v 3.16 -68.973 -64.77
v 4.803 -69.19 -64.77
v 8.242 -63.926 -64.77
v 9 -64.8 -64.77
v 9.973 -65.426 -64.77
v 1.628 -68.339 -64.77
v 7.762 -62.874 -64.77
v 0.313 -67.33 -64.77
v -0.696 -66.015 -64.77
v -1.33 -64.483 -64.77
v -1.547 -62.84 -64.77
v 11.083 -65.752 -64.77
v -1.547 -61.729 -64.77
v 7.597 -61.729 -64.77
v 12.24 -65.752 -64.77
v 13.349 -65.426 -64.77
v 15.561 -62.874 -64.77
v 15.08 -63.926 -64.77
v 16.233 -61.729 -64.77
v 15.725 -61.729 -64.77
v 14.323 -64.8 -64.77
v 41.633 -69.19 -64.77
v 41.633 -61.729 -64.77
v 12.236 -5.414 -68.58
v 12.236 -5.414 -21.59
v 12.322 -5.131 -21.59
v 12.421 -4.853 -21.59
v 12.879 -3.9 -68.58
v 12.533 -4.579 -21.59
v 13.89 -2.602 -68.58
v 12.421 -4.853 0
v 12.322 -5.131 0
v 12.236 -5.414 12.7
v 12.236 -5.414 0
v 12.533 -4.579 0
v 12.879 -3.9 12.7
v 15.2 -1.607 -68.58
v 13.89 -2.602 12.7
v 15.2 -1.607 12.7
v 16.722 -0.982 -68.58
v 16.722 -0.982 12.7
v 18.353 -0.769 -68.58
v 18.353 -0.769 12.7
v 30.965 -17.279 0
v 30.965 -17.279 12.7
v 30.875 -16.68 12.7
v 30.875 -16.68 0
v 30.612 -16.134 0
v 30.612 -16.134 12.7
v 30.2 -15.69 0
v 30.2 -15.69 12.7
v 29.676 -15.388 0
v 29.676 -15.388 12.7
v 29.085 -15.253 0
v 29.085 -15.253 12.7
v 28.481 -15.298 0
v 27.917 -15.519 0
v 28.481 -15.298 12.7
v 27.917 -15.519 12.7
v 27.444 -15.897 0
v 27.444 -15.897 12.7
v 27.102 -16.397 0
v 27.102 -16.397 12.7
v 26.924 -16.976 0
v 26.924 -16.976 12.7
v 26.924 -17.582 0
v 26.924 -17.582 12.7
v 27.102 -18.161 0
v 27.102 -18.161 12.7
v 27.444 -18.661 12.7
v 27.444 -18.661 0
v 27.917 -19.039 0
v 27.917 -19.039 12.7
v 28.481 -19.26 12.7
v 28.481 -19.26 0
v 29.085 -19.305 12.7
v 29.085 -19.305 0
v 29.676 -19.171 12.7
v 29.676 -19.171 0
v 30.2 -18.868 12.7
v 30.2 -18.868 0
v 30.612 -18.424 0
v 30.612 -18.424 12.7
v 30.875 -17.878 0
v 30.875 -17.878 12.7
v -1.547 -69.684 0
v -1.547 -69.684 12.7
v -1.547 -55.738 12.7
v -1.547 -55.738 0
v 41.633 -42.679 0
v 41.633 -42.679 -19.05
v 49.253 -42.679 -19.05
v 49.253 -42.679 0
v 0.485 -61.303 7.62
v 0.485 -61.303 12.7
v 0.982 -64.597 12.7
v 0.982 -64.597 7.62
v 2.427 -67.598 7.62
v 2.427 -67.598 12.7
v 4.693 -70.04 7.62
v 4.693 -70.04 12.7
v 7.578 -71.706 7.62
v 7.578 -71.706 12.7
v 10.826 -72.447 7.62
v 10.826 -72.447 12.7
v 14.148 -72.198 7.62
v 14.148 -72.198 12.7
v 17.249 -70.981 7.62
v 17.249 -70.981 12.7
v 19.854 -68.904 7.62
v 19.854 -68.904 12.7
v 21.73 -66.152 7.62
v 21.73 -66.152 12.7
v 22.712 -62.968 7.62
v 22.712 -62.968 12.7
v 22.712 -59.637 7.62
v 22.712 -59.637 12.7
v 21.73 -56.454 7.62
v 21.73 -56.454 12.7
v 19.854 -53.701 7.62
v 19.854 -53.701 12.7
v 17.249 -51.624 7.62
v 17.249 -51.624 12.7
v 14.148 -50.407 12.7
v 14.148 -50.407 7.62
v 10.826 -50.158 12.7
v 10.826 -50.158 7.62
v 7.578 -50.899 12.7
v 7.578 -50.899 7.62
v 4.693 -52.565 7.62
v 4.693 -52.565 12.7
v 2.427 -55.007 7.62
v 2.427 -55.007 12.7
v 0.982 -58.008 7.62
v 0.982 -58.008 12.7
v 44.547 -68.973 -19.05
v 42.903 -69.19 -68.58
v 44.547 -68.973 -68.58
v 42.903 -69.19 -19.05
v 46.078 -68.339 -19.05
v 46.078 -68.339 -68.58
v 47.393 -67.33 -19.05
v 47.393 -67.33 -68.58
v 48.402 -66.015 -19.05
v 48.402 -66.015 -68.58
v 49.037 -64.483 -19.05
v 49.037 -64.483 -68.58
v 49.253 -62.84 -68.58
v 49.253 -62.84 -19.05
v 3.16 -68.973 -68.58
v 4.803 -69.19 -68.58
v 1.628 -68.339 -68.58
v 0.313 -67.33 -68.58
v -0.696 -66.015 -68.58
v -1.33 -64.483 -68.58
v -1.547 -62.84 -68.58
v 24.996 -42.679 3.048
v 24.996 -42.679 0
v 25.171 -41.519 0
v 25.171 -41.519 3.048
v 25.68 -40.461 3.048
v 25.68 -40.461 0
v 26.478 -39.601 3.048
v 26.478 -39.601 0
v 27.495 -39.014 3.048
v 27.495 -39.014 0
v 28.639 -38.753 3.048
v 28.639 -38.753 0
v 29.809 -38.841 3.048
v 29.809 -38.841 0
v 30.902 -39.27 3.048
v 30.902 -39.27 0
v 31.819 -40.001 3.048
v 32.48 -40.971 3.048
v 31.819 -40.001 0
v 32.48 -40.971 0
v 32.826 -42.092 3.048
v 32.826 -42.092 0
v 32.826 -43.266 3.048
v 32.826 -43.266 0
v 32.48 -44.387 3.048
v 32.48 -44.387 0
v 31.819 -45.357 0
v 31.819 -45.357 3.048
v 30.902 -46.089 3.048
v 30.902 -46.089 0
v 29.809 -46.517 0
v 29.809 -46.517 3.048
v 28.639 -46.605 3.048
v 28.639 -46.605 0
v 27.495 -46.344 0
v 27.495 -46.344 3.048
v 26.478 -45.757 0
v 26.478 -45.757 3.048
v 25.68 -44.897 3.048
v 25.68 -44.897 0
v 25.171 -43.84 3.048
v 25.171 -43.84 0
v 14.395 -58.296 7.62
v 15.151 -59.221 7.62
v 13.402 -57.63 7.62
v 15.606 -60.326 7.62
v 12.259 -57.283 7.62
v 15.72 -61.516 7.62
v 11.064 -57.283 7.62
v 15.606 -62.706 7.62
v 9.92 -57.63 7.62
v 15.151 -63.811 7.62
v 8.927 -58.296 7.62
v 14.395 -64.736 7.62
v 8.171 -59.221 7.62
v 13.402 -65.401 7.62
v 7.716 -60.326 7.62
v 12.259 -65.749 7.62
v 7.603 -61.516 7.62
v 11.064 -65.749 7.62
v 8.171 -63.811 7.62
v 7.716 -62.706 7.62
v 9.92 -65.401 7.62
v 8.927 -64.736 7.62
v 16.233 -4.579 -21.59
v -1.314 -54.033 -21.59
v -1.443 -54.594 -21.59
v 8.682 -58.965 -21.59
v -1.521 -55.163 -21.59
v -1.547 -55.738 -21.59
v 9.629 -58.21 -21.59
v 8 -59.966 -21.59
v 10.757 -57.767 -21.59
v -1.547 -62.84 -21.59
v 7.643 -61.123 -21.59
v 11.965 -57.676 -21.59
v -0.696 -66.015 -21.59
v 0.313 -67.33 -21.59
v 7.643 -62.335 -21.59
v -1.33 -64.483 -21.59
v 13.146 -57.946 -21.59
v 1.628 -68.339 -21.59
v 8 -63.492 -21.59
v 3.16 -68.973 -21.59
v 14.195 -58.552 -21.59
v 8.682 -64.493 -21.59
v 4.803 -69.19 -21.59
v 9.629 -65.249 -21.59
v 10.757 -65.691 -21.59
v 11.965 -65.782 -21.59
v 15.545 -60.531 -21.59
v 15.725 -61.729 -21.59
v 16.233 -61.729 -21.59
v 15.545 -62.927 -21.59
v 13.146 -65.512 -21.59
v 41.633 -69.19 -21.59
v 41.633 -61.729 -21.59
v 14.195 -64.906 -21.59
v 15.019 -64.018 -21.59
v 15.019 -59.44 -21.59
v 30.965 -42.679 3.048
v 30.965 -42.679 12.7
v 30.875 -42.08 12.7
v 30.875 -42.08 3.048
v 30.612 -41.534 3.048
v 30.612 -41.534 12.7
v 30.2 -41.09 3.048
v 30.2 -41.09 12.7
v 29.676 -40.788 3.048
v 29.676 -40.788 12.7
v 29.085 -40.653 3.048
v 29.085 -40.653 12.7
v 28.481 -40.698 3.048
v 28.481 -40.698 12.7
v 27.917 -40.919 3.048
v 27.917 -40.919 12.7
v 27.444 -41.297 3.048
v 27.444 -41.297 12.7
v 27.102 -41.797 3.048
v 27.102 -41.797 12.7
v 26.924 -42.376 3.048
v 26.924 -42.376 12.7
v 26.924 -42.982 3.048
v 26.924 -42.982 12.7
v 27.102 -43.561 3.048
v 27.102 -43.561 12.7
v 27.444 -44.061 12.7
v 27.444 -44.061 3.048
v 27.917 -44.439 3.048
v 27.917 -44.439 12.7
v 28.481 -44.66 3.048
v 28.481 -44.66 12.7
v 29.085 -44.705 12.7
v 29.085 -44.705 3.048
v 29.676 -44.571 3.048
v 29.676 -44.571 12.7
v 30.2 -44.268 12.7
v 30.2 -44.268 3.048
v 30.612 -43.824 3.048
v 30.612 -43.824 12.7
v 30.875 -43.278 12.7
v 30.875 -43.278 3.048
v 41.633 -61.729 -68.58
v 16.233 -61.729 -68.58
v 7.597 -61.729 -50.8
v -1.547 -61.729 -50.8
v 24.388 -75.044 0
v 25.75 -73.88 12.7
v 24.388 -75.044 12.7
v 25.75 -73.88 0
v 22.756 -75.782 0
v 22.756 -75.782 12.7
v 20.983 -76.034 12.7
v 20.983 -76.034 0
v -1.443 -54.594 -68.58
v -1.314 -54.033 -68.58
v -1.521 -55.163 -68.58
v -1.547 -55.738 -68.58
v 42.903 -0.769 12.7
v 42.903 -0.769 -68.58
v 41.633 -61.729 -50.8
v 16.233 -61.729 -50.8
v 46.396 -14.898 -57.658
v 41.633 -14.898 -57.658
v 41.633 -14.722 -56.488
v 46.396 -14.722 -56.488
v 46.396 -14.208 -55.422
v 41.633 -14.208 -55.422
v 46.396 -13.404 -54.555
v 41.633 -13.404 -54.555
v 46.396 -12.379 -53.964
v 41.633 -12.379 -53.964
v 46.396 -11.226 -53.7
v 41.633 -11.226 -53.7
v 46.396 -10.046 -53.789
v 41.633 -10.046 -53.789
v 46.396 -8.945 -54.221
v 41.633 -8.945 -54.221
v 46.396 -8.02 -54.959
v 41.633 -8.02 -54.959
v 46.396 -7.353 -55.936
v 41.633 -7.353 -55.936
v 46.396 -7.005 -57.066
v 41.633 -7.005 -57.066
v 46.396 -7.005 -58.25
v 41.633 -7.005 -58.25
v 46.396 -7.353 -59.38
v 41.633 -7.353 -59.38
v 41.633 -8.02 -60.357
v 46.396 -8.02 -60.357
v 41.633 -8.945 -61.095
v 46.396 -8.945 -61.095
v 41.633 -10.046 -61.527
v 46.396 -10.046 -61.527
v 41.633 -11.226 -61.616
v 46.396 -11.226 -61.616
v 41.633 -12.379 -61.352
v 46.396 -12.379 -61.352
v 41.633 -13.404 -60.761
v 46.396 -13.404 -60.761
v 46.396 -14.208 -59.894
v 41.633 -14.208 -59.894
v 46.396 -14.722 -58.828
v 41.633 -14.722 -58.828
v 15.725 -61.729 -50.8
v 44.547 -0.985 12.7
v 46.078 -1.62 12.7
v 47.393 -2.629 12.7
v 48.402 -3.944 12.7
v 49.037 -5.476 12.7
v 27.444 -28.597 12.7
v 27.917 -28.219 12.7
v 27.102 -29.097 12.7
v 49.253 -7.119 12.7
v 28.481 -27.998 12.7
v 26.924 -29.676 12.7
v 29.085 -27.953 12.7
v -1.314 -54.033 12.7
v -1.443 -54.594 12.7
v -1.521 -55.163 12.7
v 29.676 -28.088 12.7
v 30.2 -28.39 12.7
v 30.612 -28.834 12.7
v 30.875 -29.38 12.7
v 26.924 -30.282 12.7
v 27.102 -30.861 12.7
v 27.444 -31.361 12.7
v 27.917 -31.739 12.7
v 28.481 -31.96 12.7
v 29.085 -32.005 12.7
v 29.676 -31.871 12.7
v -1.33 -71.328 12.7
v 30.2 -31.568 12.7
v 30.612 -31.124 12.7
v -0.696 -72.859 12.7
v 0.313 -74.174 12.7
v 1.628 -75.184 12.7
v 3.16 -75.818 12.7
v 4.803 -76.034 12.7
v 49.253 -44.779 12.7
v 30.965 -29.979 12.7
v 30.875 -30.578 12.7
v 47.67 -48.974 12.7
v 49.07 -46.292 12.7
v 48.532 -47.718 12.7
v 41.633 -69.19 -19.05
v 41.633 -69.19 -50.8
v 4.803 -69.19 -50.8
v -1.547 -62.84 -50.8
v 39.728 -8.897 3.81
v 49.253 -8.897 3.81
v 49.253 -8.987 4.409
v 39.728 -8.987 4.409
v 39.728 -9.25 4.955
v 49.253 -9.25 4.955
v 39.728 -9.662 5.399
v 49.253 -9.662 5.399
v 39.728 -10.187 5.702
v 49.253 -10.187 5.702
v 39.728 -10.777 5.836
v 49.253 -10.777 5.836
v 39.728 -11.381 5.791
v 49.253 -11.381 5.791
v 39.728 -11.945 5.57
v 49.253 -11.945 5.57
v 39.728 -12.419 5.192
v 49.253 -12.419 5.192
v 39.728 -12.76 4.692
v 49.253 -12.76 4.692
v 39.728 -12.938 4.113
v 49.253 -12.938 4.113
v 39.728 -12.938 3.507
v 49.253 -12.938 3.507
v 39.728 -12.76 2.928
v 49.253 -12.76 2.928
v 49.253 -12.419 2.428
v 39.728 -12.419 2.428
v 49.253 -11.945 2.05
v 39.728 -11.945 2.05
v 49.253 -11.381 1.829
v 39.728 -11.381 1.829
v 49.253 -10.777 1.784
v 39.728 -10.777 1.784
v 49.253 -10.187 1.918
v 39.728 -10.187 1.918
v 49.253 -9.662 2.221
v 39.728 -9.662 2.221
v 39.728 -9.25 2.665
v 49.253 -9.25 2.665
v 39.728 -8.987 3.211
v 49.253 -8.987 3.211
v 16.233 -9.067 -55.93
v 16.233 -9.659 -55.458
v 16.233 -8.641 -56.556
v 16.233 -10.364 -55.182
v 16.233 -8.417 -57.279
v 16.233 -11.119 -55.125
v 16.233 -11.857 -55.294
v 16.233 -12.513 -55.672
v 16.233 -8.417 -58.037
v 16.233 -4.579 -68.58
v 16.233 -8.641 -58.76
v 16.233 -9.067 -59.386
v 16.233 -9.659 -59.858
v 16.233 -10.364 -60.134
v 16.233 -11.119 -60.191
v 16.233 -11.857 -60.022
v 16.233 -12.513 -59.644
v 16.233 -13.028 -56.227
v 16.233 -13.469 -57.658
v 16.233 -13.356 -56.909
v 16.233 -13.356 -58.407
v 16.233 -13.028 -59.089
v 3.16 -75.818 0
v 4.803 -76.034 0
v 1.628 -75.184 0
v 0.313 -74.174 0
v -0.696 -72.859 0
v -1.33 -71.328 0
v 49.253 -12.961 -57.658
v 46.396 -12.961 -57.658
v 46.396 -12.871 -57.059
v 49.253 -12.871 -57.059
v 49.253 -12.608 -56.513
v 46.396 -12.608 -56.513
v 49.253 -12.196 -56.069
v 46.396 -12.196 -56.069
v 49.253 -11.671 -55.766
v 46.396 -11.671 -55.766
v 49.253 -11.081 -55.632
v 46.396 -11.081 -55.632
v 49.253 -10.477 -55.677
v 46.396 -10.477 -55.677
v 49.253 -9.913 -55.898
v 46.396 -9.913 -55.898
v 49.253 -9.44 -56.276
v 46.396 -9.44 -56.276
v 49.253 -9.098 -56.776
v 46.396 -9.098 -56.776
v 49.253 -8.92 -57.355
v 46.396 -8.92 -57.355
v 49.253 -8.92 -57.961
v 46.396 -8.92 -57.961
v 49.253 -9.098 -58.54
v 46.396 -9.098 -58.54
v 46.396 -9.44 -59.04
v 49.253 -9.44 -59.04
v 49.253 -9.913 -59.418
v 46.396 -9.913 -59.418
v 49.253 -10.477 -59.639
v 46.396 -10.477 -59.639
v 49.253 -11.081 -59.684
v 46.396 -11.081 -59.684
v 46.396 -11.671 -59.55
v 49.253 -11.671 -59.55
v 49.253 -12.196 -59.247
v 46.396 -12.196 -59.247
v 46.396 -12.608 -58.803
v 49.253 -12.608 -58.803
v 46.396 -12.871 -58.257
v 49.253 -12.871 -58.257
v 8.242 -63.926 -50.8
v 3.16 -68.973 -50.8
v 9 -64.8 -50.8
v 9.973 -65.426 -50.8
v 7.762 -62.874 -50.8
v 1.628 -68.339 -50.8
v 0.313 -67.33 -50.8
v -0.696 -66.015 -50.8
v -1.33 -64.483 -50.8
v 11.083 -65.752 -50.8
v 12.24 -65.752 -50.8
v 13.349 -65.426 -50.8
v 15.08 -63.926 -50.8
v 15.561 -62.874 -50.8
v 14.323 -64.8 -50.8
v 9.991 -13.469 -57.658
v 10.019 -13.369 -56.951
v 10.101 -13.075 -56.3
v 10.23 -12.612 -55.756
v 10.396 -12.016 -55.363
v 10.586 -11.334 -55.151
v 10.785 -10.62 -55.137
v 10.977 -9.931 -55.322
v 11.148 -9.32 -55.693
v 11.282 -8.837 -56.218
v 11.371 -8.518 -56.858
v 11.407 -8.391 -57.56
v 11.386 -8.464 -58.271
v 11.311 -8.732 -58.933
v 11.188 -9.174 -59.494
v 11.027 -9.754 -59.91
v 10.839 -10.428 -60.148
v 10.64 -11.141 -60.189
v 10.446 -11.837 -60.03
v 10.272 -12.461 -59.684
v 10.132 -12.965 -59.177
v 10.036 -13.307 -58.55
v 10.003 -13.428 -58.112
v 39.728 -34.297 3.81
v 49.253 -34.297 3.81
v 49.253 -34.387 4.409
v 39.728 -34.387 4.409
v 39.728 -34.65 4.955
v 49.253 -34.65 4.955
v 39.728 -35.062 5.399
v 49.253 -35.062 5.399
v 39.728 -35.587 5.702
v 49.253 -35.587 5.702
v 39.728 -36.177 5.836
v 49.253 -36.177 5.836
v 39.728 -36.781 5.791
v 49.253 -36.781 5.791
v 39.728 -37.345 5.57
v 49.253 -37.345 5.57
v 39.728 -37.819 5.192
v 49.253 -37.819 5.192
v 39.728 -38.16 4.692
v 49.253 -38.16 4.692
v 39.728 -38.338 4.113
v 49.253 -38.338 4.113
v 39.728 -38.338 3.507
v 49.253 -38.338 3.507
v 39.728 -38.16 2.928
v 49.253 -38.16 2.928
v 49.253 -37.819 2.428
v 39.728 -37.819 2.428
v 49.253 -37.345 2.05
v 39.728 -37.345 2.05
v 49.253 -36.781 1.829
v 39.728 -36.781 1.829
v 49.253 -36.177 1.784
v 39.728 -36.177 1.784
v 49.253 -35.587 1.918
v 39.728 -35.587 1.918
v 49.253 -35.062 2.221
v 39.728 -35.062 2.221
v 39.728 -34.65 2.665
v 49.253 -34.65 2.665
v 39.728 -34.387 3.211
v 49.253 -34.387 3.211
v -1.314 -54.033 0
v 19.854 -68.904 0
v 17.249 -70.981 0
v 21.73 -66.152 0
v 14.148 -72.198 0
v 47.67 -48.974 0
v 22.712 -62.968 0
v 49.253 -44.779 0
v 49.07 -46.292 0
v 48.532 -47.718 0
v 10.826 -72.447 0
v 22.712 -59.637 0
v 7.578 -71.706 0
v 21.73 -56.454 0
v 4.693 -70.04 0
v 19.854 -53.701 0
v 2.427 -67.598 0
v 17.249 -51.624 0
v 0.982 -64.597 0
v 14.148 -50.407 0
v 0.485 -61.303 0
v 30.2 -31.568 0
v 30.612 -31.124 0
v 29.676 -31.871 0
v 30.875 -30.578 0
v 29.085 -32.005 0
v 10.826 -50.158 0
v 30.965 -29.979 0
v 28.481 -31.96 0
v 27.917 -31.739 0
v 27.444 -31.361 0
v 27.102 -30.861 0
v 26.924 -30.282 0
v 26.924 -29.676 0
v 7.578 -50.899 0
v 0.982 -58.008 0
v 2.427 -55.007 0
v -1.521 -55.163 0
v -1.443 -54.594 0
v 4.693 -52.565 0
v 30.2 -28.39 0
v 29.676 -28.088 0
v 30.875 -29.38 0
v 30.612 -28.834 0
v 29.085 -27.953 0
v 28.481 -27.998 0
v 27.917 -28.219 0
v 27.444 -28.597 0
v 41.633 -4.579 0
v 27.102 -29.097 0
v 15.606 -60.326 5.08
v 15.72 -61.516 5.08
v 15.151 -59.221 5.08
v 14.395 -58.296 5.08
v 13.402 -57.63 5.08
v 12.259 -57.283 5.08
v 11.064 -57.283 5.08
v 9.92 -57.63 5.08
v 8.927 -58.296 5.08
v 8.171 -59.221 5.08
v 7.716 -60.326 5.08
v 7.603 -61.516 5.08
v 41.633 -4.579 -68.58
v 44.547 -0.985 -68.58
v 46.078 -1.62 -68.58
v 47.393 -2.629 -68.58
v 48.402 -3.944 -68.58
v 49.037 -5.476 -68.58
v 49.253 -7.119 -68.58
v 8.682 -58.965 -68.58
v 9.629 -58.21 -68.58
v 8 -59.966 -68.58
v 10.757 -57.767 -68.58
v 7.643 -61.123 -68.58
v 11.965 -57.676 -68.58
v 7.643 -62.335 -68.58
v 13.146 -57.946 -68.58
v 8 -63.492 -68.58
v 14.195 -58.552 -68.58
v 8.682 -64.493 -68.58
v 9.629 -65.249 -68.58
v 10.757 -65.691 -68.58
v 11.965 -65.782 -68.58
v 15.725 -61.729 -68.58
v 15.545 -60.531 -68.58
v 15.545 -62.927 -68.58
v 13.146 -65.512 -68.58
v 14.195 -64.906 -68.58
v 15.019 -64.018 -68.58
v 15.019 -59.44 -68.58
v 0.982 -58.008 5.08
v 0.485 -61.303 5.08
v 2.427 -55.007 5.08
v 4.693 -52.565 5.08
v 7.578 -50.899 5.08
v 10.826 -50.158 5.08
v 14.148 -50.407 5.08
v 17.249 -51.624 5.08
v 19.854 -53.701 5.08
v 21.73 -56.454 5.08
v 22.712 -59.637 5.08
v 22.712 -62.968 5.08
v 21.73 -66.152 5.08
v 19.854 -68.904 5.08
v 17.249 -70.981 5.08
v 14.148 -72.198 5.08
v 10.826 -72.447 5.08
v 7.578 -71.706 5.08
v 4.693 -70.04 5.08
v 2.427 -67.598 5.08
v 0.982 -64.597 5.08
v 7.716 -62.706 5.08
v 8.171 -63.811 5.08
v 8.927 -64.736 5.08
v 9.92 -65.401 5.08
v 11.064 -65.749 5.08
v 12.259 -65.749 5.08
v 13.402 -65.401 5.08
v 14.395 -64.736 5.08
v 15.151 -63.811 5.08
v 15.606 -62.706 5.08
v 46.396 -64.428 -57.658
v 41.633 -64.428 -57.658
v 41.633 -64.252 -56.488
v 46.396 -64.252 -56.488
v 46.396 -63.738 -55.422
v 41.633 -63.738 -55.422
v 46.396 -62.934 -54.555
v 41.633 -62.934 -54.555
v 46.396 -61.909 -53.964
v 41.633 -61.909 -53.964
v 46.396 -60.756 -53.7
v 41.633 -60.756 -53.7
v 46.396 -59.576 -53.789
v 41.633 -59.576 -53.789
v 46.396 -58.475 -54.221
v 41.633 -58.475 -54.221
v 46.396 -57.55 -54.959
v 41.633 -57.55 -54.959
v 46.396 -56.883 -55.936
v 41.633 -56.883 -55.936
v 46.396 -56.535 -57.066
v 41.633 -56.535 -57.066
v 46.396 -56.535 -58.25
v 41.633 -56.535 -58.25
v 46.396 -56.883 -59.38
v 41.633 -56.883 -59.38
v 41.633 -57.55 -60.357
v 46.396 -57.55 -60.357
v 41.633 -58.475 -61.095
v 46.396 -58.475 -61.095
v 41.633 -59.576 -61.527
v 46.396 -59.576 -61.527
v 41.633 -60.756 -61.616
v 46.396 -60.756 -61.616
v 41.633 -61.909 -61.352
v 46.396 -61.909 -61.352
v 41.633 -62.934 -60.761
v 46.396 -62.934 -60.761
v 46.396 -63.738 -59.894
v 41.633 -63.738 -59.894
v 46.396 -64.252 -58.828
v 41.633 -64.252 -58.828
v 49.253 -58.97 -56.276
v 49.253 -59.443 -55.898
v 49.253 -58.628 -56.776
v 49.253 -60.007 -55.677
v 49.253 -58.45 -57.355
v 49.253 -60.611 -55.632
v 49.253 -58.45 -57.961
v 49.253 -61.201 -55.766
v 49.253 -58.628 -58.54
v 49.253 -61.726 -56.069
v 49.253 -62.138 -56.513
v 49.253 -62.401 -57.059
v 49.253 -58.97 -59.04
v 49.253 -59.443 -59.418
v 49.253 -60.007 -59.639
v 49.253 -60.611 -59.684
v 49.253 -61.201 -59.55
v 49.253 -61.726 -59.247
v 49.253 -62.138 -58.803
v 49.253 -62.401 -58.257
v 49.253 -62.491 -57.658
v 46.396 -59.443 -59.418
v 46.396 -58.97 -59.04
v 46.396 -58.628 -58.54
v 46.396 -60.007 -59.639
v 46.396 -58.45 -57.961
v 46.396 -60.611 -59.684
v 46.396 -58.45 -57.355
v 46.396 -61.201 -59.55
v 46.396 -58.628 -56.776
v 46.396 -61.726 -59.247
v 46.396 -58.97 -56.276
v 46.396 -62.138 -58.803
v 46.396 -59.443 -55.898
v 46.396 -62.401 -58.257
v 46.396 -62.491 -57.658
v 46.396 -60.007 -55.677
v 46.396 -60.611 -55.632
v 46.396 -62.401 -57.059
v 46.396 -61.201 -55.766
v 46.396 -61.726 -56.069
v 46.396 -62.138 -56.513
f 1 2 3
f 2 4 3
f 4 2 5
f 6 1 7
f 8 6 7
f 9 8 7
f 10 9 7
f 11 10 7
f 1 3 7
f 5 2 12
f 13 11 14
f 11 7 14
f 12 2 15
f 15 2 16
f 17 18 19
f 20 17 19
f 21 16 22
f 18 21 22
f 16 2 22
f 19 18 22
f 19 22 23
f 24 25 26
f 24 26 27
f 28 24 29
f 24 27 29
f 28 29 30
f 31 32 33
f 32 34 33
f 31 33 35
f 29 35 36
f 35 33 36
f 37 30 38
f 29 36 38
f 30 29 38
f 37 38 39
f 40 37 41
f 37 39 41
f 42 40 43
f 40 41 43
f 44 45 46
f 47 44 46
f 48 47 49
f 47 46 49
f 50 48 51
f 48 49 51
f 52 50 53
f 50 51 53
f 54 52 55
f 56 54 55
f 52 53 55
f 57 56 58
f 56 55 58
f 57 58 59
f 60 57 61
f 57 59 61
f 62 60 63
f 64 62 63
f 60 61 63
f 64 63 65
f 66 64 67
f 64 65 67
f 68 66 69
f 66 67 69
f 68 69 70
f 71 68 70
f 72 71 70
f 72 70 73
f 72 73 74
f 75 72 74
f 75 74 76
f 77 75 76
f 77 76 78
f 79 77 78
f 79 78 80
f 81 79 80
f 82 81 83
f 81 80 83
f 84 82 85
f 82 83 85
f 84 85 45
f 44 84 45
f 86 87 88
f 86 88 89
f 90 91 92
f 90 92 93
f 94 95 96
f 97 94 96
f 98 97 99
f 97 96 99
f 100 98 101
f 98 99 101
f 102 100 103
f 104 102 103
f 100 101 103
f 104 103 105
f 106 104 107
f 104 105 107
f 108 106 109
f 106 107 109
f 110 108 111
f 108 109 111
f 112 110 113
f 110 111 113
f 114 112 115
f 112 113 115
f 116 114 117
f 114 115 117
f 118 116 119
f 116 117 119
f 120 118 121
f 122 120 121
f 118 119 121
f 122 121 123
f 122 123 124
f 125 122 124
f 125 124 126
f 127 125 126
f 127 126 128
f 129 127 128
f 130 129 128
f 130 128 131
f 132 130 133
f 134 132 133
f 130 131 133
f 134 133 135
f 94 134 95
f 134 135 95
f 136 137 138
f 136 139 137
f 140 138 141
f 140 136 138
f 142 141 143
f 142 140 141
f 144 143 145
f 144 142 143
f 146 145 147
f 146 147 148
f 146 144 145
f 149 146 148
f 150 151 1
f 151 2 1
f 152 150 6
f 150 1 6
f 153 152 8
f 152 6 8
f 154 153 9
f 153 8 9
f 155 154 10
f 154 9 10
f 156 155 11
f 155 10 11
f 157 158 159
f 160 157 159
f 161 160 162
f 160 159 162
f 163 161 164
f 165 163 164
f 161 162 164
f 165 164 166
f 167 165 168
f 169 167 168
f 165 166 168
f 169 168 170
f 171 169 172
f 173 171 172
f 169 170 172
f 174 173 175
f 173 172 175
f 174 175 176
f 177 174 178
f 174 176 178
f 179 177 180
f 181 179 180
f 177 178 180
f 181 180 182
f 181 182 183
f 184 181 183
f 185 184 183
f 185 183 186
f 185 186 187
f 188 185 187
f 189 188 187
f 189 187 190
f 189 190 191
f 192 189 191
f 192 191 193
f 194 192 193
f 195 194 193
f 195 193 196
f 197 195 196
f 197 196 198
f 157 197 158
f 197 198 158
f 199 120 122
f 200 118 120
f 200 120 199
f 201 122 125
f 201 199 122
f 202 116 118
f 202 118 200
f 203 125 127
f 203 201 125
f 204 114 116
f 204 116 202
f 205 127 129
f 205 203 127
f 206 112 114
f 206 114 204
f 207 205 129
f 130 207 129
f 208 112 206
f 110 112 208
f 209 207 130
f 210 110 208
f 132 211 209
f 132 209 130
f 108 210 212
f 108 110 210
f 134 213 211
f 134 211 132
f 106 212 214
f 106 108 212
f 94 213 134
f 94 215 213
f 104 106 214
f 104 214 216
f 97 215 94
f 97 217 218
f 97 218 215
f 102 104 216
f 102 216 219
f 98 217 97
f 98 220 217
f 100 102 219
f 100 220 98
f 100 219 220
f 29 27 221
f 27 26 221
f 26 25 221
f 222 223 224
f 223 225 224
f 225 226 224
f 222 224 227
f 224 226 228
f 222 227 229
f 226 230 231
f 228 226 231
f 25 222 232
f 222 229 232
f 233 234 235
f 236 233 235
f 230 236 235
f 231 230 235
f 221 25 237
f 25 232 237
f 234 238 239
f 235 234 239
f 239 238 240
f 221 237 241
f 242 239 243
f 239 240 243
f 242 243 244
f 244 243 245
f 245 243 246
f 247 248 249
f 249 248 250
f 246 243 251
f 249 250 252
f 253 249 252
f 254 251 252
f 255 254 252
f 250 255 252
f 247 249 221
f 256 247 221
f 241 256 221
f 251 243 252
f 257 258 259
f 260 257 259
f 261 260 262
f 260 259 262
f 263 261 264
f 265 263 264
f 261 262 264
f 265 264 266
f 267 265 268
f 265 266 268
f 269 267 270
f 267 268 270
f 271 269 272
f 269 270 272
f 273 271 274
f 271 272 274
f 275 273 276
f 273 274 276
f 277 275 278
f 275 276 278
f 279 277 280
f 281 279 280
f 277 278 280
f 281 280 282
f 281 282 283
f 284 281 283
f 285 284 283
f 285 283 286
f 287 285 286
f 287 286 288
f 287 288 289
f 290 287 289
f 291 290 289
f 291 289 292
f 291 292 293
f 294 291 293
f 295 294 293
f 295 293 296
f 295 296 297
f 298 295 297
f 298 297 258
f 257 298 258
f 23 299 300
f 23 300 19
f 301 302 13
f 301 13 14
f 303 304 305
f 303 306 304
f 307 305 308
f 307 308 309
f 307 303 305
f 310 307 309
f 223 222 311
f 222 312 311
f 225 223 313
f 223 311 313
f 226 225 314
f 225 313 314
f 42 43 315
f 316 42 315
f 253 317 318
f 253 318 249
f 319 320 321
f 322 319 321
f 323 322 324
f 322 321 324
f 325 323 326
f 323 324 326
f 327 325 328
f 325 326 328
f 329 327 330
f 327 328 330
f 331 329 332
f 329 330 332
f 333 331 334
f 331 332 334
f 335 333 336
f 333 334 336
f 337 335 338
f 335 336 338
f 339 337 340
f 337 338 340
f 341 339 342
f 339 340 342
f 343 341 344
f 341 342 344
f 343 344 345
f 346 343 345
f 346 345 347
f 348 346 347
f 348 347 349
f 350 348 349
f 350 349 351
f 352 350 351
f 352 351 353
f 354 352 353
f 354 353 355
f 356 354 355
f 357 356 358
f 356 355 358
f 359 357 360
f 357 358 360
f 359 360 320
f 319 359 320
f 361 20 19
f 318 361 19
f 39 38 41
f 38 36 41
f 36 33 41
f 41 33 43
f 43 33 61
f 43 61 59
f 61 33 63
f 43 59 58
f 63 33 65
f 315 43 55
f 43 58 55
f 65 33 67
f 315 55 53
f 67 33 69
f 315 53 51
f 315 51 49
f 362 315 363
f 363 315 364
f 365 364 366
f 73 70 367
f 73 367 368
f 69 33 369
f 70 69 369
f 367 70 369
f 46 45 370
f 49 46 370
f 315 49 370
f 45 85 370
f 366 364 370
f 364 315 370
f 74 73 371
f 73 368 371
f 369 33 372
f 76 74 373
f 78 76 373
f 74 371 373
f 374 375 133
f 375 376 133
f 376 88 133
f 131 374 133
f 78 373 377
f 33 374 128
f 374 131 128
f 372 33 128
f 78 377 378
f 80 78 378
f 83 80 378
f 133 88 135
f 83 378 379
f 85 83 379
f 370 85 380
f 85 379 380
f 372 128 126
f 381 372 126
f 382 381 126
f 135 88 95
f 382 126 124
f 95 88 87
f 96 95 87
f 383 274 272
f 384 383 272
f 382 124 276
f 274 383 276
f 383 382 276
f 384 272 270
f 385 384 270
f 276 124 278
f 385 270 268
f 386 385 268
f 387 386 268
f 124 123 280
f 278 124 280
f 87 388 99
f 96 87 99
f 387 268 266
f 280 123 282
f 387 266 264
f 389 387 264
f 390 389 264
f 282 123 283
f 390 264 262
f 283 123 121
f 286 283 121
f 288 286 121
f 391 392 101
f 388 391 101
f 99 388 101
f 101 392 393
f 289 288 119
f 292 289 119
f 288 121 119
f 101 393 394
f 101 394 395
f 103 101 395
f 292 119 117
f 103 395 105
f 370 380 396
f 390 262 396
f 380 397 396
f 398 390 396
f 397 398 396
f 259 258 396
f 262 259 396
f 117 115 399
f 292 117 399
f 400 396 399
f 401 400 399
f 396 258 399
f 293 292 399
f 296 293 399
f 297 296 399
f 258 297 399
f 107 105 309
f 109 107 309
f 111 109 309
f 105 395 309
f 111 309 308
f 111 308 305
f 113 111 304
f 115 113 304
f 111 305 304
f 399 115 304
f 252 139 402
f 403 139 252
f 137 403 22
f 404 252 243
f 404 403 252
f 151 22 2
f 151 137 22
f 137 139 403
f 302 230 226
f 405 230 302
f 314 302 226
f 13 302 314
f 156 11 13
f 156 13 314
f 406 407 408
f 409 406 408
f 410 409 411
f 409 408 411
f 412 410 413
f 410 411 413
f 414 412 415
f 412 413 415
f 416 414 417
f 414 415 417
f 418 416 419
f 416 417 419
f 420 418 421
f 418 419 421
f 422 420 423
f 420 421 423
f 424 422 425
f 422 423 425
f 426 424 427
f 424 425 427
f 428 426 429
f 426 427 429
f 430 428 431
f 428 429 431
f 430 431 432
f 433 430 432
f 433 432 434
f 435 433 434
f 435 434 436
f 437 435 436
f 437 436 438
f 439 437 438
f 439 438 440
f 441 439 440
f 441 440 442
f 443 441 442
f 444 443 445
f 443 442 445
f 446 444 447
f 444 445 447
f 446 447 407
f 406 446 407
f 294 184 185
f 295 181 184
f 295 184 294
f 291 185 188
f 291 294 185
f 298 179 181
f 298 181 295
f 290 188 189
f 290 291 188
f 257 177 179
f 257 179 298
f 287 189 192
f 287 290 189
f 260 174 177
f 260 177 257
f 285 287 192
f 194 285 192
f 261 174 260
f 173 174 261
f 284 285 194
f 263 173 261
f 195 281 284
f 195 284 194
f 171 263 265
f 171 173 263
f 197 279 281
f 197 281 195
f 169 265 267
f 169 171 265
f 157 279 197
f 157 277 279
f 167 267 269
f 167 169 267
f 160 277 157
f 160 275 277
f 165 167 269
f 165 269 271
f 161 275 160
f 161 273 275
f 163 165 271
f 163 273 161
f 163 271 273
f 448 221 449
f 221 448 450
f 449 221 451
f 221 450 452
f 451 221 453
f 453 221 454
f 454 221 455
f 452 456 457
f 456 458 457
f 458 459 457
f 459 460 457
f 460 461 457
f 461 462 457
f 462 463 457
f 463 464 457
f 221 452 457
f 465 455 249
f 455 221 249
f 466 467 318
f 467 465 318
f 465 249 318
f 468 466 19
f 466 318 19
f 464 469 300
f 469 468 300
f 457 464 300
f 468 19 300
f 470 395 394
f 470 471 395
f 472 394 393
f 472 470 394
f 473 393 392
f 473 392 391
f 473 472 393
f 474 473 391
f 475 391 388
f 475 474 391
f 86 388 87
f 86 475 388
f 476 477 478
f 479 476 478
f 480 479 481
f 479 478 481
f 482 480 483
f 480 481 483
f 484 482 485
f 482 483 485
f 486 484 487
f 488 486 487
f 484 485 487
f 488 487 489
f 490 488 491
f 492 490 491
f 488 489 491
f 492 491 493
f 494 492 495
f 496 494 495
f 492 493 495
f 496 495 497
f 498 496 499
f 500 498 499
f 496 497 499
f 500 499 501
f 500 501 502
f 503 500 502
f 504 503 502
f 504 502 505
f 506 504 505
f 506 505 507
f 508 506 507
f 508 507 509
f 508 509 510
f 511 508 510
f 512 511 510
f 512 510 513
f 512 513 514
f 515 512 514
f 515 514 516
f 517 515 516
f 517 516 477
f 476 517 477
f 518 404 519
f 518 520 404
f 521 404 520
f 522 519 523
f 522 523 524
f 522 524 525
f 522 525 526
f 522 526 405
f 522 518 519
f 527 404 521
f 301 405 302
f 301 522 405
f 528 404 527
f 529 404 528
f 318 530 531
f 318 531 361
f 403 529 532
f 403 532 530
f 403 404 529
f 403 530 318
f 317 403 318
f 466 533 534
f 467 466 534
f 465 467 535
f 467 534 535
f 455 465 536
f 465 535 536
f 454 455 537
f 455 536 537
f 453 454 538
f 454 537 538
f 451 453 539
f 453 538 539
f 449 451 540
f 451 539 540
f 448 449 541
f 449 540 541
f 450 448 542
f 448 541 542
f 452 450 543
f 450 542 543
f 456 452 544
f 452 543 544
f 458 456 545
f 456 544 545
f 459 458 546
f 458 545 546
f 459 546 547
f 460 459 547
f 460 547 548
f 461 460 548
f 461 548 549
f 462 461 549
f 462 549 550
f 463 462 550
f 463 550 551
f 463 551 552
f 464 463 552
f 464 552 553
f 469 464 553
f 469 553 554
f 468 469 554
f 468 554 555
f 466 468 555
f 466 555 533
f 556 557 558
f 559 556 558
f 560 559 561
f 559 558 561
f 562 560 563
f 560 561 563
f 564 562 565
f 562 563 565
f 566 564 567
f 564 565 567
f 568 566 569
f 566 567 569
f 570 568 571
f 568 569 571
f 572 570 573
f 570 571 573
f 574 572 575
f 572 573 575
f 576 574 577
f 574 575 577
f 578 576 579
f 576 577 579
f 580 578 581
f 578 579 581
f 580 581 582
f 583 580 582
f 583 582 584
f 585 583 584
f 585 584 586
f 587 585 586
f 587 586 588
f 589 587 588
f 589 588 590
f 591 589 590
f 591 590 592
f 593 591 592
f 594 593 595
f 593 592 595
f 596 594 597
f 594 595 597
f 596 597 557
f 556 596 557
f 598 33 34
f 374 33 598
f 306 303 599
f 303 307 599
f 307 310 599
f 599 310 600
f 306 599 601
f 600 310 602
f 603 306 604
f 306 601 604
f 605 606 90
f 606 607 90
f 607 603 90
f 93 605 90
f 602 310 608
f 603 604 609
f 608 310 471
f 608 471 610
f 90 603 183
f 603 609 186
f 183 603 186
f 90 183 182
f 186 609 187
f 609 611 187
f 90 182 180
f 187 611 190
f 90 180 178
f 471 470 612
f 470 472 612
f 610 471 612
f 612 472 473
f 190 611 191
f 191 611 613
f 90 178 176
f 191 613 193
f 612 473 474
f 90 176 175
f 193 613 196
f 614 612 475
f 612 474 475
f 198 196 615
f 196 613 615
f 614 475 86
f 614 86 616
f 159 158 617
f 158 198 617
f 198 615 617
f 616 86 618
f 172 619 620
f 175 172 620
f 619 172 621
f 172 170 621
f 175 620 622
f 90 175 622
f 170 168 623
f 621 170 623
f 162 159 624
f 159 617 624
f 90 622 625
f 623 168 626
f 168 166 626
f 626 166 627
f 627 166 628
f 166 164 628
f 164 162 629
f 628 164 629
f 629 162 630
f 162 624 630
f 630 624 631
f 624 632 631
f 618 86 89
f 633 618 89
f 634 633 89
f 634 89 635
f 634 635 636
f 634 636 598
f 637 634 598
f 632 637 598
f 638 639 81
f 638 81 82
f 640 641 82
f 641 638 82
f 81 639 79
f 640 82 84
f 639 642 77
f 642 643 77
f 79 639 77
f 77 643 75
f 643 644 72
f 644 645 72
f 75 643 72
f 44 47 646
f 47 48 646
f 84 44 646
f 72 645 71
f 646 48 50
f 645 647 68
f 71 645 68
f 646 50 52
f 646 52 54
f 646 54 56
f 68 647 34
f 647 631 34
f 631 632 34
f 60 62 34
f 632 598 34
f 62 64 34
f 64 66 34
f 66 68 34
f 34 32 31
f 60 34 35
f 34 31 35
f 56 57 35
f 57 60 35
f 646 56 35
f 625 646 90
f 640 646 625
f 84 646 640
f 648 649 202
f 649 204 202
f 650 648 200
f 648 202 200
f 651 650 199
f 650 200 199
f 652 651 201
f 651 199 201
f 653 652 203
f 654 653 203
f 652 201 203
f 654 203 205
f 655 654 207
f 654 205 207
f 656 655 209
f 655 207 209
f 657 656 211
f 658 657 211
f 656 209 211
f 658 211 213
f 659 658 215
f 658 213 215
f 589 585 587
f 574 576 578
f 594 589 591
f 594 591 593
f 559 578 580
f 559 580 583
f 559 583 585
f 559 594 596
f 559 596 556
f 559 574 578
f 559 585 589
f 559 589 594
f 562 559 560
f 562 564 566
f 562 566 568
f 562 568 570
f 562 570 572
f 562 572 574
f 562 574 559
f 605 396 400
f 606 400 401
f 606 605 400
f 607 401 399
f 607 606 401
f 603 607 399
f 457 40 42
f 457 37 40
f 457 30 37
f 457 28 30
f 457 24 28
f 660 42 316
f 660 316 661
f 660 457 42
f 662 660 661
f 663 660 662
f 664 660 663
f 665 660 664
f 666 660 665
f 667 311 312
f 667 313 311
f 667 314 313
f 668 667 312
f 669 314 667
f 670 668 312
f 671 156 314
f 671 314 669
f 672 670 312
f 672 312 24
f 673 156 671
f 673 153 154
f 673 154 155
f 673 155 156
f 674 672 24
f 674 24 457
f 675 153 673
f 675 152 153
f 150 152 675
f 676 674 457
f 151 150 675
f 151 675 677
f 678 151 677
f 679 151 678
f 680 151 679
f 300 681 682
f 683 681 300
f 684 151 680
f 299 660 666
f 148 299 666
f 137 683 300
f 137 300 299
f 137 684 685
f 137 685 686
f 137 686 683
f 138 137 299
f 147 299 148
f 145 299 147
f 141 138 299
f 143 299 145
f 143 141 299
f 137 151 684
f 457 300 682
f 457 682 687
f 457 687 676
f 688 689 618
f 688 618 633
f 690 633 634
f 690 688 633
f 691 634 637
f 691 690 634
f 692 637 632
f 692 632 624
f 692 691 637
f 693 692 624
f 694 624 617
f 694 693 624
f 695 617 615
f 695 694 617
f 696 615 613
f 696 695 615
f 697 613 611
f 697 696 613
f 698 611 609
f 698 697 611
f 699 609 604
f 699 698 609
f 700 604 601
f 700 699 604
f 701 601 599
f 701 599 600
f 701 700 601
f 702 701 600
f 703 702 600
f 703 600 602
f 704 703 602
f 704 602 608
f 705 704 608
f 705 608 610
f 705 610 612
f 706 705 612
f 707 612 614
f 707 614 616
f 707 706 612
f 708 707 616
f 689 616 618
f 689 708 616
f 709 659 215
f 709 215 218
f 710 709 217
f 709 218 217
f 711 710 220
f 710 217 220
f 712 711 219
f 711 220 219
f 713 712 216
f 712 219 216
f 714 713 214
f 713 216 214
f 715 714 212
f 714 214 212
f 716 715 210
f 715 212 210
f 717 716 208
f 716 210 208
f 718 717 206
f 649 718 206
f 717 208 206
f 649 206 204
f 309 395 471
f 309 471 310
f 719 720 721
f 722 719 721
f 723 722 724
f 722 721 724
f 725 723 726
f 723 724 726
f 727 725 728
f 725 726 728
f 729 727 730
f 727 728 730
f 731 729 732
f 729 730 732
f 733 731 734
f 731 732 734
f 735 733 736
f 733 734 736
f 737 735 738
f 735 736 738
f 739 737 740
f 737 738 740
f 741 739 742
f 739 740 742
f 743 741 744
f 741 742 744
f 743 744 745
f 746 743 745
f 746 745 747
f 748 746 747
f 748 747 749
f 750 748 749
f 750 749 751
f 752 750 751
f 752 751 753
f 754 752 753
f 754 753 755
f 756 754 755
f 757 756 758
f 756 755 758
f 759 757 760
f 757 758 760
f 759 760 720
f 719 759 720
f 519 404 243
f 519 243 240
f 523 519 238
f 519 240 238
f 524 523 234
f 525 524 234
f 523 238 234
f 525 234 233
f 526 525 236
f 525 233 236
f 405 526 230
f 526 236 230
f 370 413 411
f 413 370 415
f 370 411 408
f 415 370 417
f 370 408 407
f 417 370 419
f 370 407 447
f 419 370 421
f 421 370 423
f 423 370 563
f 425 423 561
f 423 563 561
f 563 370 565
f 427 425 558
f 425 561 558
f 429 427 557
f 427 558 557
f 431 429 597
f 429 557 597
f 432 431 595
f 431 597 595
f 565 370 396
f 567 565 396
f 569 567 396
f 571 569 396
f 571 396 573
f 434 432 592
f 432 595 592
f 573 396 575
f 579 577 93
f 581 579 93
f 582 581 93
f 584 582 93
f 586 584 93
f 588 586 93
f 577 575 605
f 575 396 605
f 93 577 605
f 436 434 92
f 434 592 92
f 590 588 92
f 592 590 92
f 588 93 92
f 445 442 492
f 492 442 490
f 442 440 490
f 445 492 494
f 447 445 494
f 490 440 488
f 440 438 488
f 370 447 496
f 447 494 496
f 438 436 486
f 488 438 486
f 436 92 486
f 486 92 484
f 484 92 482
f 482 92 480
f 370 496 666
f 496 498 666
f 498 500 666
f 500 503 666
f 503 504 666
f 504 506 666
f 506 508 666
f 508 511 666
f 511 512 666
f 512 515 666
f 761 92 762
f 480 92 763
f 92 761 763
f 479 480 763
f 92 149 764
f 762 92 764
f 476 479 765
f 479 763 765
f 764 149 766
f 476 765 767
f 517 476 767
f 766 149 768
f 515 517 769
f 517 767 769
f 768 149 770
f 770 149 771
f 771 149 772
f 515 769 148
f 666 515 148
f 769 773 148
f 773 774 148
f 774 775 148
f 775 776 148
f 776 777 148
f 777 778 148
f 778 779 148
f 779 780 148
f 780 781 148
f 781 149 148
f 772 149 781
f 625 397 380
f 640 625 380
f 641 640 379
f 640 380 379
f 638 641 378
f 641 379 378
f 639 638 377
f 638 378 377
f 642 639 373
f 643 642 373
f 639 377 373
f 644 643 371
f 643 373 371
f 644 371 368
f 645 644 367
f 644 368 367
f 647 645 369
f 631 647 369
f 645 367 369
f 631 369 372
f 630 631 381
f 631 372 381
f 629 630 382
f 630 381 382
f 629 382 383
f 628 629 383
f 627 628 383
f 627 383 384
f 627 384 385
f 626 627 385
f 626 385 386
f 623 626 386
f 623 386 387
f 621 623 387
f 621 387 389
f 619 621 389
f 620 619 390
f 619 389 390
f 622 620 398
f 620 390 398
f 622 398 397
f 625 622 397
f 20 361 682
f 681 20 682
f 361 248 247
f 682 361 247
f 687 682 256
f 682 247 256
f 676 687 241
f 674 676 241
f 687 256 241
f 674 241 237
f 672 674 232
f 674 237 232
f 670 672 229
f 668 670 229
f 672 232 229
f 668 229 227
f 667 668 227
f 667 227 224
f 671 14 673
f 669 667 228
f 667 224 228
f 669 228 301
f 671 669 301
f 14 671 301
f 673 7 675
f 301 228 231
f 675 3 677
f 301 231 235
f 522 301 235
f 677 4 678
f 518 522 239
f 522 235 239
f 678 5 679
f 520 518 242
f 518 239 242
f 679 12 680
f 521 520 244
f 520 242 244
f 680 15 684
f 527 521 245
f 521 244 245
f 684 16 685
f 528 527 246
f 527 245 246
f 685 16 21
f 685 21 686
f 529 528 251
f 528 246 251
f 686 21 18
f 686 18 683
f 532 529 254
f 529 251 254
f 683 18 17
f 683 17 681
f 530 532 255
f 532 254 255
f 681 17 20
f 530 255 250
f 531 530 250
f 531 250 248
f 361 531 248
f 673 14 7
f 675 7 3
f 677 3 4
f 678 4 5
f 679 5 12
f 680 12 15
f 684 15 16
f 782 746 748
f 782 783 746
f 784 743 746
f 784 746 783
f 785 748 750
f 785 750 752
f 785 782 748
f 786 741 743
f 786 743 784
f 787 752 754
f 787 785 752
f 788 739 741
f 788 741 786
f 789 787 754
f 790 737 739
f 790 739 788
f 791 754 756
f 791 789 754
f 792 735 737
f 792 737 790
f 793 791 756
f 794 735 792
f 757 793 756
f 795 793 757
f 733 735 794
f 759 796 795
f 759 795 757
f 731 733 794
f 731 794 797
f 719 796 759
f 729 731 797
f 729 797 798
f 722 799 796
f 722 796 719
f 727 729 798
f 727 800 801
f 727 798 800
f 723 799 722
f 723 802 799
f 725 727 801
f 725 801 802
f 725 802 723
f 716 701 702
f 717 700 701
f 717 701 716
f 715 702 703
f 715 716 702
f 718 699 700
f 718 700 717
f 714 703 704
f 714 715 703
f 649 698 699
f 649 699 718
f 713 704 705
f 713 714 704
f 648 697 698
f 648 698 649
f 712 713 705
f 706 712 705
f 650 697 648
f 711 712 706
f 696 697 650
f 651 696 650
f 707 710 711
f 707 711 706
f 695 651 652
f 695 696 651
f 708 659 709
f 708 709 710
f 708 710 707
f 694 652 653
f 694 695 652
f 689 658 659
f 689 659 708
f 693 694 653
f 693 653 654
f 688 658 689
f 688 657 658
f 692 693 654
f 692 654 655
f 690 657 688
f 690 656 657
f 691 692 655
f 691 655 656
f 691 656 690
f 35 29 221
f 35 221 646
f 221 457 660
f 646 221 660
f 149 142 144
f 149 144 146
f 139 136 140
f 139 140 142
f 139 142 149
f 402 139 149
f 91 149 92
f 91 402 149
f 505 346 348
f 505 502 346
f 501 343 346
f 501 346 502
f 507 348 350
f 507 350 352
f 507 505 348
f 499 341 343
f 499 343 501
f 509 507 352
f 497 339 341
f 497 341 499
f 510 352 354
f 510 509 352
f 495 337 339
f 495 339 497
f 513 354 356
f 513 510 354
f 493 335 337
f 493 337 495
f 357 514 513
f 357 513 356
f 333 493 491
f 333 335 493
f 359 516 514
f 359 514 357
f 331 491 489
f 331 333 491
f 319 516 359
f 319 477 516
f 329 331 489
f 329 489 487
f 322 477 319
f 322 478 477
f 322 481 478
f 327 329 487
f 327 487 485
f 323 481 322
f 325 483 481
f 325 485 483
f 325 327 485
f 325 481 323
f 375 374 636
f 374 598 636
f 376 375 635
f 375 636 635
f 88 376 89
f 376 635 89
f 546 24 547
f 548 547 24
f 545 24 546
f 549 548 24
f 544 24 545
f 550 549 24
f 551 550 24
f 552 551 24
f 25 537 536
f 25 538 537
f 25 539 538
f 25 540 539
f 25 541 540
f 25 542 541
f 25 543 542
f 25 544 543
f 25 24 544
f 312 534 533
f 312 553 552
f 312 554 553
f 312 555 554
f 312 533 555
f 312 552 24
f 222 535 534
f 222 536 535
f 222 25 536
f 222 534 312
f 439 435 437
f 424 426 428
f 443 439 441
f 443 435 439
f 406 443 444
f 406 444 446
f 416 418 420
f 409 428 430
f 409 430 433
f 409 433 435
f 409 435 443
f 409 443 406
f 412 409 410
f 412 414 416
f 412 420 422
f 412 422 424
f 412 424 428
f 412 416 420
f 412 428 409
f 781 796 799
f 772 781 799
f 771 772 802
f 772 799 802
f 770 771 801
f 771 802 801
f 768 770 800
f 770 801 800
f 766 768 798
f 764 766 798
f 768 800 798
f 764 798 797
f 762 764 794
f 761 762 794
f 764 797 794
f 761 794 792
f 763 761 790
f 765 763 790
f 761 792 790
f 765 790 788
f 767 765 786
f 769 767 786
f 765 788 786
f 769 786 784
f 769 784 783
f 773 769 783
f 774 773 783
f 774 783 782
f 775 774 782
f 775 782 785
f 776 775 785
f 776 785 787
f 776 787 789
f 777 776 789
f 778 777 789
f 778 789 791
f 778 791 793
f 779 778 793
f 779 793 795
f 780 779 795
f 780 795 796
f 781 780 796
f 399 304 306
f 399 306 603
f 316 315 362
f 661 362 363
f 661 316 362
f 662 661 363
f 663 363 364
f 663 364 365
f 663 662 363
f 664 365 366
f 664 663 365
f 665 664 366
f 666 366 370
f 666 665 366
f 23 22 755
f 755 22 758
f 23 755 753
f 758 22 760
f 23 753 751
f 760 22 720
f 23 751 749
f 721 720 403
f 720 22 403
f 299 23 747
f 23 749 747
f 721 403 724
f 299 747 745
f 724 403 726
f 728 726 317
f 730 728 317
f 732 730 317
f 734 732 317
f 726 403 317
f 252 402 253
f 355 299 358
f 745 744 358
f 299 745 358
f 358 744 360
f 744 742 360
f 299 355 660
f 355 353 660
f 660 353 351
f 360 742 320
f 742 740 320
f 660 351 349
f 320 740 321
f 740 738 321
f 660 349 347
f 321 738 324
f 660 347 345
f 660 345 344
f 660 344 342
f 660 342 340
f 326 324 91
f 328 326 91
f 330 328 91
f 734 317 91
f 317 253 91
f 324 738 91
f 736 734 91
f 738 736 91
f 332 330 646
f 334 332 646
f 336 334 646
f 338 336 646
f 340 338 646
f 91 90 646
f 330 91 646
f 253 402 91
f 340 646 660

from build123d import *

# Parameters (mm, degrees)
SKETCH1_W            = 50.8
SKETCH1_H            = 76.2
BOSS_EXTRUDE1_DEPTH  = 12.7
SKETCH3_R            = 2.032
CUT_EXTRUDE1_DEPTH   = 12.7
SKETCH17_W           = 7.62
SKETCH17_H           = 76.2
BOSS_EXTRUDE13_DEPTH = 68.58
SKETCH18_W           = 3.81
SKETCH18_H           = 19.05
BOSS_EXTRUDE14_DEPTH = 43.18
SKETCH19_W           = 29.21
SKETCH19_H           = 19.05
BOSS_EXTRUDE15_DEPTH = 43.18
SKETCH4_R            = 4.064
CUT_EXTRUDE5_DEPTH   = 125.729995039
CUT_EXTRUDE6_START   = -5.08
SKETCH21_R           = 11.176
SKETCH21_R_2         = 4.064
CUT_EXTRUDE6_DEPTH   = 5.08
SKETCH22_R           = 11.176
SKETCH22_R_2         = 4.064
CUT_EXTRUDE7_DEPTH   = 5.08
SKETCH23_W           = 19.05
SKETCH23_H           = 38.1
CUT_EXTRUDE8_DEPTH   = 115.424594585
SKETCH26_W           = 17.78
SKETCH26_H           = 46.99
BOSS_EXTRUDE16_DEPTH = 57.15
SKETCH28_W           = 50.8
SKETCH28_H           = 81.28
BOSS_EXTRUDE18_DEPTH = 3.81
SKETCH35_R           = 4.064
CUT_EXTRUDE10_DEPTH  = 125.729995039
SKETCH32_R           = 2.032
CUT_EXTRUDE12_DEPTH  = 9.525
SKETCH41_R           = 2.032
CUT_EXTRUDE14_DEPTH  = 9.525
SKETCH43_R           = 3.96875
CUT_EXTRUDE15_DEPTH  = 4.7625
SKETCH46_R           = 3.937
CUT_EXTRUDE17_DEPTH  = 3.048
SKETCH48_R           = 2.54
CUT_EXTRUDE18_DEPTH  = 25.908
SKETCH49_W           = 50.8
SKETCH49_H           = 4.744734857
CUT_EXTRUDE19_DEPTH  = 92.202
CUT_EXTRUDE20_DEPTH  = 92.202
SKETCH52_W           = 50.8
SKETCH52_H           = 6.844747076
CUT_EXTRUDE21_DEPTH  = 62.484
CUT_EXTRUDE22_DEPTH  = 23.876
FILLET1_R            = 6.35
FILLET2_R            = 6.35
FILLET3_R            = 6.35
FILLET4_R            = 6.35
FILLET5_R            = 6.35
FILLET6_R            = 6.35
FILLET7_R            = 6.35
FILLET8_R            = 6.35


with BuildPart() as part:
    # Sketch1 → Boss-Extrude1 (new body)
    with BuildSketch(Plane.XY):
        with Locations((23.853164533, -42.679075546)):
            Rectangle(SKETCH1_W, SKETCH1_H)
    extrude(amount=BOSS_EXTRUDE1_DEPTH)

    # Sketch3 → Cut-Extrude1 (cut)
    with BuildSketch(Plane.XY.offset(12.7)):
        with Locations((28.933164533, -42.679075546)):
            Circle(SKETCH3_R)
        with Locations((28.933164533, -29.979075546)):
            Circle(SKETCH3_R)
        with Locations((28.933164533, -17.279075546)):
            Circle(SKETCH3_R)
    extrude(amount=-CUT_EXTRUDE1_DEPTH, mode=Mode.SUBTRACT)

    # Sketch17 → Boss-Extrude13 (add)
    with BuildSketch(Plane(origin=(0, 0, 0), x_dir=(-1, 0, 0), z_dir=(0, 0, -1))):
        with Locations((-45.443164533, -42.679075546)):
            Rectangle(SKETCH17_W, SKETCH17_H)
    extrude(amount=BOSS_EXTRUDE13_DEPTH)

    # Sketch18 → Boss-Extrude14 (add)
    with BuildSketch(Plane.ZY.offset(-41.633164533)):
        with Locations((-66.675, -71.254075546)):
            Rectangle(SKETCH18_W, SKETCH18_H)
    extrude(amount=BOSS_EXTRUDE14_DEPTH)

    # Sketch19 → Boss-Extrude15 (add)
    with BuildSketch(Plane.ZY.offset(-41.633164533)):
        with Locations((-36.195, -71.254075546)):
            Rectangle(SKETCH19_W, SKETCH19_H)
    extrude(amount=BOSS_EXTRUDE15_DEPTH)

    # Sketch4 → Cut-Extrude5 (cut, through all)
    with BuildSketch(Plane.XY.offset(12.7)):
        with Locations((11.661164533, -61.30266317)):
            Circle(SKETCH4_R)
    extrude(amount=-CUT_EXTRUDE5_DEPTH, mode=Mode.SUBTRACT)

    # Sketch21 → Cut-Extrude6 (cut)
    with BuildSketch(Plane(origin=(0, 0, 0), x_dir=(-1, 0, 0), z_dir=(0, 0, -1)).offset(CUT_EXTRUDE6_START)):
        with Locations((-11.661164533, -61.30266317)):
            Circle(SKETCH21_R)
        with Locations(Location((-11.661164533, -61.30266317, 0), (0, 0, 180))):
            Circle(SKETCH21_R_2, mode=Mode.SUBTRACT)
    extrude(amount=CUT_EXTRUDE6_DEPTH, mode=Mode.SUBTRACT)

    # Sketch22 → Cut-Extrude7 (cut)
    with BuildSketch(Plane.XY.offset(12.7)):
        with Locations(Location((11.661164533, -61.30266317, 0), (0, 0, 180))):
            Circle(SKETCH22_R)
        with Locations((11.661164533, -61.30266317)):
            Circle(SKETCH22_R_2, mode=Mode.SUBTRACT)
    extrude(amount=-CUT_EXTRUDE7_DEPTH, mode=Mode.SUBTRACT)

    # Sketch23 → Cut-Extrude8 (cut, through all)
    with BuildSketch(Plane.ZY.offset(-41.633164533)):
        with Locations((-9.525, -61.729075546)):
            Rectangle(SKETCH23_W, SKETCH23_H)
    extrude(amount=-CUT_EXTRUDE8_DEPTH, mode=Mode.SUBTRACT)

    # Sketch26 → Boss-Extrude16 (add)
    with BuildSketch(Plane(origin=(0, -61.729075546, 0), x_dir=(1, 0, 0), z_dir=(0, 1, 0))):
        with Locations((7.343164533, 45.085)):
            Rectangle(SKETCH26_W, SKETCH26_H)
    extrude(amount=BOSS_EXTRUDE16_DEPTH)

    # Sketch28 → Boss-Extrude18 (add)
    with BuildSketch(Plane(origin=(0, -4.579075546, 0), x_dir=(1, 0, 0), z_dir=(0, 1, 0))):
        with Locations((23.853164533, 27.94)):
            Rectangle(SKETCH28_W, SKETCH28_H)
    extrude(amount=BOSS_EXTRUDE18_DEPTH)

    # Sketch35 → Cut-Extrude10 (cut, through all)
    with BuildSketch(Plane.XY.offset(12.7)):
        with Locations((11.661164533, -61.729075546)):
            Circle(SKETCH35_R)
    extrude(amount=-CUT_EXTRUDE10_DEPTH, mode=Mode.SUBTRACT)

    # Sketch32 → Cut-Extrude12 (cut)
    with BuildSketch(Plane(origin=(49.253164533, 0, 0), x_dir=(0, 0, -1), z_dir=(1, 0, 0))):
        with Locations(Location((-3.81, -36.329075546, 0), (0, 0, 90))):
            Circle(SKETCH32_R)
        with Locations(Location((-3.81, -10.929075546, 0), (0, 0, 90))):
            Circle(SKETCH32_R)
    extrude(amount=-CUT_EXTRUDE12_DEPTH, mode=Mode.SUBTRACT)

    # Sketch41 → Cut-Extrude14 (cut)
    with BuildSketch(Plane.ZY.offset(-41.633164533)):
        with Locations(Location((-57.658, -10.929075546, 0), (0, 0, 270))):
            Circle(SKETCH41_R)
        with Locations(Location((-57.658, -60.459075546, 0), (0, 0, 270))):
            Circle(SKETCH41_R)
    extrude(amount=-CUT_EXTRUDE14_DEPTH, mode=Mode.SUBTRACT)

    # Sketch43 → Cut-Extrude15 (cut)
    with BuildSketch(Plane.ZY.offset(-41.633164533)):
        with Locations(Location((-57.658, -10.929075546, 0), (0, 0, 270))):
            Circle(SKETCH43_R)
        with Locations(Location((-57.658, -60.459075546, 0), (0, 0, 270))):
            Circle(SKETCH43_R)
    extrude(amount=-CUT_EXTRUDE15_DEPTH, mode=Mode.SUBTRACT)

    # Sketch46 → Cut-Extrude17 (cut)
    with BuildSketch(Plane(origin=(0, 0, 0), x_dir=(-1, 0, 0), z_dir=(0, 0, -1))):
        with Locations((-28.933164533, -42.679075546)):
            Circle(SKETCH46_R)
    extrude(amount=-CUT_EXTRUDE17_DEPTH, mode=Mode.SUBTRACT)

    # Sketch48 → Cut-Extrude18 (cut)
    with BuildSketch(Plane.ZY.offset(1.546835467)):
        with Locations(Location((-57.658, -10.929075546, 0), (0, 0, 270))):
            Circle(SKETCH48_R)
    extrude(amount=-CUT_EXTRUDE18_DEPTH, mode=Mode.SUBTRACT)

    # Sketch49 → Cut-Extrude19 (cut)
    with BuildSketch(Plane.XY.offset(12.7)):
        with Locations((23.853164533, -78.406708118)):
            Rectangle(SKETCH49_W, SKETCH49_H)
    extrude(amount=-CUT_EXTRUDE19_DEPTH, mode=Mode.SUBTRACT)

    # Sketch51 → Cut-Extrude20 (cut)
    with BuildSketch(Plane.XY.offset(12.7)):
        Polygon((13.530749107, -0.769075546), (-1.546835467, -54.869608678), (-1.546835467, -0.769075546), align=None)
    extrude(amount=-CUT_EXTRUDE20_DEPTH, mode=Mode.SUBTRACT)

    # Sketch52 → Cut-Extrude21 (cut)
    with BuildSketch(Plane(origin=(0, 0, -68.58), x_dir=(-1, 0, 0), z_dir=(0, 0, -1))):
        with Locations((-23.853164533, -72.611967151)):
            Rectangle(SKETCH52_W, SKETCH52_H)
    extrude(amount=-CUT_EXTRUDE21_DEPTH, mode=Mode.SUBTRACT)

    # Sketch53 → Cut-Extrude22 (cut)
    with BuildSketch(Plane.XY.offset(12.7)):
        Polygon((23.853164533, -76.034340689), (49.253164533, -47.175169833), (49.253164533, -76.034340689), align=None)
    extrude(amount=-CUT_EXTRUDE22_DEPTH, mode=Mode.SUBTRACT)

    # Fillet1
    fillet1_edges = [part.edges().sort_by_distance(p)[0] for p in [
        (-1.546835467, -54.869608678, -45.085),
    ]]
    fillet(fillet1_edges, radius=FILLET1_R)

    # Fillet2
    # the kernel refuses this fillet: 6.35 mm, written as the material it takes off along each edge
    with BuildSketch(Plane(origin=(13.530749107, -0.769075546, 24.755694059), x_dir=(-0.26846462888250333, -0.9632895426812126, 0), z_dir=(0, 0, -1))) as fillet2_piece_1:
        with BuildLine():
            CenterArc((FILLET2_R * 0.759413798972, -FILLET2_R), FILLET2_R, 90, 74.427076266)
            Line((-FILLET2_R * 0.203875743709, -FILLET2_R * 0.731535371117), (0, 0))
            Line((0, 0), (FILLET2_R * 0.759413798972, 0))
        make_face()
    extrude(amount=105.391388117, mode=Mode.SUBTRACT)

    # Fillet3
    fillet3_edges = [part.edges().sort_by_distance(p)[0] for p in [
        (-1.546835467, -54.869608678, 6.35),
    ]]
    fillet(fillet3_edges, radius=FILLET3_R)

    # Fillet4
    fillet4_edges = [part.edges().sort_by_distance(p)[0] for p in [
        (49.253164533, -0.769075546, -27.94),
    ]]
    fillet(fillet4_edges, radius=FILLET4_R)

    # Fillet5
    fillet5_edges = [part.edges().sort_by_distance(p)[0] for p in [
        (49.253164533, -47.175169833, 6.35),
    ]]
    fillet(fillet5_edges, radius=FILLET5_R)

    # Fillet6
    fillet6_edges = [part.edges().sort_by_distance(p)[0] for p in [
        (-1.546835467, -76.034340689, 6.35),
        (23.853164533, -76.034340689, 6.35),
    ]]
    fillet(fillet6_edges, radius=FILLET6_R)

    # Fillet7
    fillet7_edges = [part.edges().sort_by_distance(p)[0] for p in [
        (-1.546835467, -69.189593613, -66.675),
        (-1.546835467, -69.189593613, -36.195),
    ]]
    fillet(fillet7_edges, radius=FILLET7_R)

    # Fillet8
    fillet8_edges = [part.edges().sort_by_distance(p)[0] for p in [
        (49.253164533, -69.189593613, -43.815),
    ]]
    fillet(fillet8_edges, radius=FILLET8_R)


solid = part.part
